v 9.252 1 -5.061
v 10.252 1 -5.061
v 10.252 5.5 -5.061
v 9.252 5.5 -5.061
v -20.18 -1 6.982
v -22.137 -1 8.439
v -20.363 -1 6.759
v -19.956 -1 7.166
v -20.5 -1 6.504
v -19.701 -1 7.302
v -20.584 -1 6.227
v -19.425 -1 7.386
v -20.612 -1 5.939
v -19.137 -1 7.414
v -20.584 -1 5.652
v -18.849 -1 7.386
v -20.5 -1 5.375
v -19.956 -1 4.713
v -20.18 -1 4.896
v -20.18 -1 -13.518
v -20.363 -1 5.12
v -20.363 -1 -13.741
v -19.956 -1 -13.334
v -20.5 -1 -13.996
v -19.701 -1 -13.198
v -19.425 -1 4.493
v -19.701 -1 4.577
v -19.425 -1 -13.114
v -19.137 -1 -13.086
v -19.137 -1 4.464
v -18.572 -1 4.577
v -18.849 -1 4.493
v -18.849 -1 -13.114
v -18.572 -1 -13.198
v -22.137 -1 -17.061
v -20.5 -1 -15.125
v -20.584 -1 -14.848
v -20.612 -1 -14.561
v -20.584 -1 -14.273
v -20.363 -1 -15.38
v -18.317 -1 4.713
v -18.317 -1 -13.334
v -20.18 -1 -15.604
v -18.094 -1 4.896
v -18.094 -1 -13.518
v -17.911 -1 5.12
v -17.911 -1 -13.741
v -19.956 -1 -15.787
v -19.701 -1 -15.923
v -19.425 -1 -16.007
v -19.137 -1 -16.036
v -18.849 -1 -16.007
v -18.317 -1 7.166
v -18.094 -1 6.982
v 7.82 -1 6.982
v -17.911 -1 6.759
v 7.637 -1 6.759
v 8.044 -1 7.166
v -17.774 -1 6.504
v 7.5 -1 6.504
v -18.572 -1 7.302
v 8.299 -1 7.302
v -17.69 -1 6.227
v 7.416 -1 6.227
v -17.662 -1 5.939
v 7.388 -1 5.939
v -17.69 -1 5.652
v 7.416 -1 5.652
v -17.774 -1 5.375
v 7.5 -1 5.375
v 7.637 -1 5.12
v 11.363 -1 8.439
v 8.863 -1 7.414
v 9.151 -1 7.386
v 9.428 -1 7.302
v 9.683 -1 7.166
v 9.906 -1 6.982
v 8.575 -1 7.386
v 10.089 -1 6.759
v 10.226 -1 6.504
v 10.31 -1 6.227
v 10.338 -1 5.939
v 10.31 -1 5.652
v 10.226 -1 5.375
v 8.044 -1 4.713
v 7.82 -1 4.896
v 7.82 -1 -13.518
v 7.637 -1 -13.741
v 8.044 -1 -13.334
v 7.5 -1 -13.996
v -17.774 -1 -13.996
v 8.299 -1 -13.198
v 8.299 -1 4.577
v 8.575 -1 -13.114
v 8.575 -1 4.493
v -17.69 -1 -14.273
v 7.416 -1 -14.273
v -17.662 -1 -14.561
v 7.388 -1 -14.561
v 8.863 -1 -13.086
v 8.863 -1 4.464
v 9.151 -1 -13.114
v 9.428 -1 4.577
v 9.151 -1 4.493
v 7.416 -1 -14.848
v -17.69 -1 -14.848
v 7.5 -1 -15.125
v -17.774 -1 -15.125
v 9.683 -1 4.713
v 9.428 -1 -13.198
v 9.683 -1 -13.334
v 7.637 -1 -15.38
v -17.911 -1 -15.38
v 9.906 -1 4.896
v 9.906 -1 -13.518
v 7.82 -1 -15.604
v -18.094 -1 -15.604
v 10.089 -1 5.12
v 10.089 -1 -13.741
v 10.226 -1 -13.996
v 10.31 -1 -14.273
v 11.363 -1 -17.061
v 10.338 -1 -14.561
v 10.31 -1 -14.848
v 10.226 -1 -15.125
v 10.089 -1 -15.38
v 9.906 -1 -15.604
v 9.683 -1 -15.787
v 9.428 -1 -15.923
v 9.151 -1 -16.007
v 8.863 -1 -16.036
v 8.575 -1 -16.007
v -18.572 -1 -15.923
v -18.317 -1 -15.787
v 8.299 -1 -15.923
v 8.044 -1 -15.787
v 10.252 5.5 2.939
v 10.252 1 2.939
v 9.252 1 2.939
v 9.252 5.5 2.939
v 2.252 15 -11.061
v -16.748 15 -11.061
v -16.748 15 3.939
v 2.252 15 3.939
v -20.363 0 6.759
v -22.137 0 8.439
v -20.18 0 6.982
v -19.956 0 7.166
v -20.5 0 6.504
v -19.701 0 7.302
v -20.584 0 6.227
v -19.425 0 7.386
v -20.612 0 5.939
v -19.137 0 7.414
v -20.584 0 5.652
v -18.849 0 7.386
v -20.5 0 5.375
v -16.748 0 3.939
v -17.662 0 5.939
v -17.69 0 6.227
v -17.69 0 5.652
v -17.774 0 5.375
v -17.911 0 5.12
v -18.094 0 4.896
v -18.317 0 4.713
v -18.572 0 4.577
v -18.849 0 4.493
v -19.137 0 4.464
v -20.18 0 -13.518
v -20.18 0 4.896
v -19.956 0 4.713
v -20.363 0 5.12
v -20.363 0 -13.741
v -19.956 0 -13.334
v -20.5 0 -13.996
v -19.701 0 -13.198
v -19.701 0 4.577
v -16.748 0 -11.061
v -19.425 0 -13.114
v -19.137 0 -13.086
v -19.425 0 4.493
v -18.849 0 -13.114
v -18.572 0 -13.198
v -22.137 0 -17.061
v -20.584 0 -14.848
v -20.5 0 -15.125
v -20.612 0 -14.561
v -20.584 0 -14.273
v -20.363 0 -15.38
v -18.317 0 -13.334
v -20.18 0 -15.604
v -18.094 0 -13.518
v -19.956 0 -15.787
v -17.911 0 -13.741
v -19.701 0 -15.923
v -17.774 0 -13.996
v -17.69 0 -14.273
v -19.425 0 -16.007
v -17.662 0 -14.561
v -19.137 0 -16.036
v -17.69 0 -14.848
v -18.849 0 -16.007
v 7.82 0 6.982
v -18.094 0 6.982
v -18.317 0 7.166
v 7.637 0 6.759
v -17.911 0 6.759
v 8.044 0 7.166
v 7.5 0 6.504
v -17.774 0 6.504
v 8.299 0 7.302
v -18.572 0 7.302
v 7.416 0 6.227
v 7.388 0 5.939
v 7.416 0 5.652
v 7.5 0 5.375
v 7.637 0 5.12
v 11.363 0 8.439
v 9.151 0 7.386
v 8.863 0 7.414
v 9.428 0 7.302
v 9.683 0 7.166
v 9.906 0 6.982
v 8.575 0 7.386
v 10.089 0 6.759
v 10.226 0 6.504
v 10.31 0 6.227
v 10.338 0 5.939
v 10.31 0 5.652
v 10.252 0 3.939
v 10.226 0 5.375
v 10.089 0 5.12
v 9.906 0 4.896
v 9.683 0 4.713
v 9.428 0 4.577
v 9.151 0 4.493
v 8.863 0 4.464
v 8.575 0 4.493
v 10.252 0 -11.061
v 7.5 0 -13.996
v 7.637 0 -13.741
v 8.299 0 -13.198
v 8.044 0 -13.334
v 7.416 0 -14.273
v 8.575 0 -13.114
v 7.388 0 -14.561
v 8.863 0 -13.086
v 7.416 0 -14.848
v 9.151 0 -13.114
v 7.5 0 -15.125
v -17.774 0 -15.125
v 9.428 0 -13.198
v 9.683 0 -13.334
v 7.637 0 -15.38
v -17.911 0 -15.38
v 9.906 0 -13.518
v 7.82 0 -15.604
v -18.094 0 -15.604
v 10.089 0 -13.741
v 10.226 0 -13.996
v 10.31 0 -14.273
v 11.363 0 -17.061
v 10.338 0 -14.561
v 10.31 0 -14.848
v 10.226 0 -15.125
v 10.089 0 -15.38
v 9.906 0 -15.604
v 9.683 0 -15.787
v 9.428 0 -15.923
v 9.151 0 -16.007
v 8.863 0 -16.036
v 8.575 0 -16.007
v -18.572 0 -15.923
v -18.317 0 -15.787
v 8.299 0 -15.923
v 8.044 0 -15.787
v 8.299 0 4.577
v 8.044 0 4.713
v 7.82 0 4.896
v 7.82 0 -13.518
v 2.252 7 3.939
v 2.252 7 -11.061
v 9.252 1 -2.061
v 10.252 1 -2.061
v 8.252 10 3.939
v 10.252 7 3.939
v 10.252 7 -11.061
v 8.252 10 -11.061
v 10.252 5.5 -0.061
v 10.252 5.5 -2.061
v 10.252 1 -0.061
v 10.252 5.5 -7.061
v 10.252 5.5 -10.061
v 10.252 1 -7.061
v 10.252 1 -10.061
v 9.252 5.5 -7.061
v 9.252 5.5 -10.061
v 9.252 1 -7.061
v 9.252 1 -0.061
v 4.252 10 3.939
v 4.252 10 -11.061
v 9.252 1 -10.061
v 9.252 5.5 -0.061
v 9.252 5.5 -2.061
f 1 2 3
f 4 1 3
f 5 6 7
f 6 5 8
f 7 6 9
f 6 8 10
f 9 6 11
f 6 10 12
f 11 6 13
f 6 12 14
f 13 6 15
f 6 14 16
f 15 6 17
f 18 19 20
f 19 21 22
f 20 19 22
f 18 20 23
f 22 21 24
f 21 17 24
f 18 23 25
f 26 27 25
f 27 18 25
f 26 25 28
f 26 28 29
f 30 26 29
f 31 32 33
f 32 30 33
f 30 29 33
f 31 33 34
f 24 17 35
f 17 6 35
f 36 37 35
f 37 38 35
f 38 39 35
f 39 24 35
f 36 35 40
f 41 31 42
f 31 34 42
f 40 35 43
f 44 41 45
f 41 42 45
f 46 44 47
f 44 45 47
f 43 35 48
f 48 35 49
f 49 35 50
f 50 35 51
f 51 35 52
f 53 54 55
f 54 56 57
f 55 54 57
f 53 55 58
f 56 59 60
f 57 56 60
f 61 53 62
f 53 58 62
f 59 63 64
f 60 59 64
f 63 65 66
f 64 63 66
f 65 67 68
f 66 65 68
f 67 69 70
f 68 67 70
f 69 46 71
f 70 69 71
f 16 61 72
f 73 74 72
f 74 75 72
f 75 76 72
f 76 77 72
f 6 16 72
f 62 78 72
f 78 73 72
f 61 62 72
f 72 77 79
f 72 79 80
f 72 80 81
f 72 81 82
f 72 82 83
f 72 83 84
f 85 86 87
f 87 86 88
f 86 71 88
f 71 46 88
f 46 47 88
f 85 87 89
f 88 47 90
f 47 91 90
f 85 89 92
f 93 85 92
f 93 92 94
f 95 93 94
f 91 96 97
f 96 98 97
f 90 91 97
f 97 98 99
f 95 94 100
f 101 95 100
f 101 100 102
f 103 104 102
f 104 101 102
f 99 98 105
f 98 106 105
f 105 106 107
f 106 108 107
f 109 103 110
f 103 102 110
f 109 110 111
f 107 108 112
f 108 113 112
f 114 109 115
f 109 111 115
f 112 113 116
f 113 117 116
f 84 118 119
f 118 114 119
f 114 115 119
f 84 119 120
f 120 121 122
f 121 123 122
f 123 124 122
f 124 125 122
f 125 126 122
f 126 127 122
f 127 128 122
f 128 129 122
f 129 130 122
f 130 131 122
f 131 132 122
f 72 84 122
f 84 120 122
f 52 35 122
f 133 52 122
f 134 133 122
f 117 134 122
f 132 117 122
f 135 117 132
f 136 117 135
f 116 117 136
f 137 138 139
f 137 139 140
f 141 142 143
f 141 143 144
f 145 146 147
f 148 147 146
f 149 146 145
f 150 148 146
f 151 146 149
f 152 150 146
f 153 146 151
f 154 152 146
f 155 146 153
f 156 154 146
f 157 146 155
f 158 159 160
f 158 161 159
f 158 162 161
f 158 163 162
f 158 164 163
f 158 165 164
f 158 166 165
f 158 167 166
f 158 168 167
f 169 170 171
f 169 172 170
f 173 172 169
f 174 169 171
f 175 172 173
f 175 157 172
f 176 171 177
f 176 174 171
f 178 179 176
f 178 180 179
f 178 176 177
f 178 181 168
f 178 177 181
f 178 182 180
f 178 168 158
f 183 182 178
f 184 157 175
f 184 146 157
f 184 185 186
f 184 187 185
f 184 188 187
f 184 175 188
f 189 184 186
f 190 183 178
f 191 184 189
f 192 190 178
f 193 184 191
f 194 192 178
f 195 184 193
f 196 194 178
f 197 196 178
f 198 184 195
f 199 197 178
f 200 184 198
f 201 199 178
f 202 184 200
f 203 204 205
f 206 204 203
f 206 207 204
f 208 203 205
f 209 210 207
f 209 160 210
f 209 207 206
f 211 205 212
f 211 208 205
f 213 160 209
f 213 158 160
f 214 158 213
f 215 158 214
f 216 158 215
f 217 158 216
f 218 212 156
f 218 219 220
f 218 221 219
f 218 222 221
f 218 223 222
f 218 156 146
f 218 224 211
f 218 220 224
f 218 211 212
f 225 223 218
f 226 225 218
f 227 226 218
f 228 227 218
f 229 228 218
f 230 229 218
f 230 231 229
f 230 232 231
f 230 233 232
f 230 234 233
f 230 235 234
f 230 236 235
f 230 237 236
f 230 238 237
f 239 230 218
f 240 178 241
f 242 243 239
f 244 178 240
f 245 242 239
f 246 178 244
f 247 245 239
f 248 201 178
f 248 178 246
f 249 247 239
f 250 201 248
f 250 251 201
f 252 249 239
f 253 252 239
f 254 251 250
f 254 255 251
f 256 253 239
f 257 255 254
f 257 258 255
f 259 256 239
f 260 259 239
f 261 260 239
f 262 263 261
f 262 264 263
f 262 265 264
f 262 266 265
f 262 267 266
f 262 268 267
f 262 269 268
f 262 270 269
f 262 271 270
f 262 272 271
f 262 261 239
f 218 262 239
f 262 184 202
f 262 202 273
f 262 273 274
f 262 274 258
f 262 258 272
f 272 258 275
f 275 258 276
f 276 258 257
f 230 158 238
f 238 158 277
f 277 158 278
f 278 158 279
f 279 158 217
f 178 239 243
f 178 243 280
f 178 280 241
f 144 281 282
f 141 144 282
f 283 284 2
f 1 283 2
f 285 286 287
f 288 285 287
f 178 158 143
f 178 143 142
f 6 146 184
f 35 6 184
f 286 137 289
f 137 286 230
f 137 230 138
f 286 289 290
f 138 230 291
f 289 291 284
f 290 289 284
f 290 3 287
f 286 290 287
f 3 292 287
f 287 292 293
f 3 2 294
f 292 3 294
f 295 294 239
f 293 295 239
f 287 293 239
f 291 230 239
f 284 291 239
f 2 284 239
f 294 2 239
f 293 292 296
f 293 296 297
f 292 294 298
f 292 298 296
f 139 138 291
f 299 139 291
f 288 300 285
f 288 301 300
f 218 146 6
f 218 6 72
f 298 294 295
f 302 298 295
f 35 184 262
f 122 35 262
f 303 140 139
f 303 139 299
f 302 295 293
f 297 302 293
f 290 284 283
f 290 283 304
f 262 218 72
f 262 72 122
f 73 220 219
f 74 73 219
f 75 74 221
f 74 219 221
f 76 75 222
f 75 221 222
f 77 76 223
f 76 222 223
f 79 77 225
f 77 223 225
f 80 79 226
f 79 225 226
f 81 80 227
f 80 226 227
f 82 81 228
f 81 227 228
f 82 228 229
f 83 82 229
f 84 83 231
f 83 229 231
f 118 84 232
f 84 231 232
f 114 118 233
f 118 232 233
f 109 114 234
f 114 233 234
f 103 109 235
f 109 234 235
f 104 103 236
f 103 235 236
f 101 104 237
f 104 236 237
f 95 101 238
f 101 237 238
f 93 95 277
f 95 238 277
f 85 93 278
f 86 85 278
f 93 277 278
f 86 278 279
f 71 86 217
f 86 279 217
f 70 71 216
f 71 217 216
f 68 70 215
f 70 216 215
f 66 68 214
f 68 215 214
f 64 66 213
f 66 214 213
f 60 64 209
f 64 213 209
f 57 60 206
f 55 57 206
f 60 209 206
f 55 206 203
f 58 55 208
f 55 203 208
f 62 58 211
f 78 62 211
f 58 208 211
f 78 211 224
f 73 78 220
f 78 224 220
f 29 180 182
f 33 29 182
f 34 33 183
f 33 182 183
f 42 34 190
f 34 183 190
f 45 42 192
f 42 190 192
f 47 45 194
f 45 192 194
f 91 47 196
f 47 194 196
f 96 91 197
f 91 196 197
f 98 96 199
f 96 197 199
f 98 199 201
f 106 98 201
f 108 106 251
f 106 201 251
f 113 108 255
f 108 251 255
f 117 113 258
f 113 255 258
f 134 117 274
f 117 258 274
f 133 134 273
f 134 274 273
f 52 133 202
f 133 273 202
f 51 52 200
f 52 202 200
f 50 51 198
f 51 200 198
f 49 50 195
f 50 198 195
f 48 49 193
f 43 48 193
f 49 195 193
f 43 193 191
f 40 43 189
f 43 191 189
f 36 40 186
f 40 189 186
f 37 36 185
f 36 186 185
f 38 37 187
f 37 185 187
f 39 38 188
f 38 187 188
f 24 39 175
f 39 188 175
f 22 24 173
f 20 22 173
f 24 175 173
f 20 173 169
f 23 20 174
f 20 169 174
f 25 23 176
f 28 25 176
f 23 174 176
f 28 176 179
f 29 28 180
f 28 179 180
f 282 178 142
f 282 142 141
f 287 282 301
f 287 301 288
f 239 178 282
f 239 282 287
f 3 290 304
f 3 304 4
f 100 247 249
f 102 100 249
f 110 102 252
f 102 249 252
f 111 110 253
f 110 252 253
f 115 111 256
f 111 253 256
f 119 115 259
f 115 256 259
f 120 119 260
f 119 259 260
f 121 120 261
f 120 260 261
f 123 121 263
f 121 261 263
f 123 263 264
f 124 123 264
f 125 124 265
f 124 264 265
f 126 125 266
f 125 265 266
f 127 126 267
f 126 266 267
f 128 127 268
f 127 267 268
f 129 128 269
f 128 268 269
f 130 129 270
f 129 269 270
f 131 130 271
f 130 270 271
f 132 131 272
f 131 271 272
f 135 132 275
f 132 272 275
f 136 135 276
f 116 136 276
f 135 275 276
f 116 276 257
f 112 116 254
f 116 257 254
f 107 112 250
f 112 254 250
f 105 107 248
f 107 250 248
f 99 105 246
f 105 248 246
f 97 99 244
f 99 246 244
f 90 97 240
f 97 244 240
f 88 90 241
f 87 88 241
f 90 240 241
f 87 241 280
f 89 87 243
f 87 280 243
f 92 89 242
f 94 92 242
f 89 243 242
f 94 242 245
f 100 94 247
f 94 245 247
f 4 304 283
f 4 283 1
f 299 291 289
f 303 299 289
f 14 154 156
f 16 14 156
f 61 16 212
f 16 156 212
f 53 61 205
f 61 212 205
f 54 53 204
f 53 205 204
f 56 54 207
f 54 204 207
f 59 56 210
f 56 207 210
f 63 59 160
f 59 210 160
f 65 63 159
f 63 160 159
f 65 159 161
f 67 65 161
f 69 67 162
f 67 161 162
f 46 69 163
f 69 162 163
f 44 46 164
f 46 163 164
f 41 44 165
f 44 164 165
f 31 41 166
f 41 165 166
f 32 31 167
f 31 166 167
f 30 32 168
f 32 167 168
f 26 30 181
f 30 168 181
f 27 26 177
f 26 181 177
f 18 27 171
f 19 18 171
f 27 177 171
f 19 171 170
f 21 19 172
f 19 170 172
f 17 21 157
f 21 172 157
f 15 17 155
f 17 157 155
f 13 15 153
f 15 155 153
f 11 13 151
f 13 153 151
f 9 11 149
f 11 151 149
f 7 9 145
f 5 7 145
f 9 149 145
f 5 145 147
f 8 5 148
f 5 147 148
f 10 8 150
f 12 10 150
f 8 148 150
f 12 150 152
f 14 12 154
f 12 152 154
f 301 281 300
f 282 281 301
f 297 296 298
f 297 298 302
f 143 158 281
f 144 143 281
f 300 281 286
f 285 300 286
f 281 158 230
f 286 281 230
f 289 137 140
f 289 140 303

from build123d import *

# Parameters (mm, degrees)
ESQUISSE1_W             = 33.5
ESQUISSE1_H             = 25.5
ESQUISSE1_R             = 1.475
BOSS_EXTRU_9_DEPTH      = 1
ESQUISSE1_17_W          = 8
ESQUISSE1_17_H          = 15
BOSS_EXTRU_12_DEPTH     = 10
CHANFREIN5_SIZE         = 2
CHANFREIN5_SIZE2        = 3
ESQUISSE6_W             = 3
ESQUISSE6_H             = 4.5
ENL_V_MAT_EXTRU_1_DEPTH = 1
ESQUISSE1_18_W          = 19
ESQUISSE1_18_H          = 15
BOSS_EXTRU_14_DEPTH     = 15


with BuildPart() as part:
    # Esquisse1 → Boss.-Extru.9 (new body)
    with BuildSketch(Plane(origin=(0, 0, 0), x_dir=(1, 0, 0), z_dir=(0, 1, 0))):
        with Locations((-5.3869574, 4.310655738)):
            Rectangle(ESQUISSE1_W, ESQUISSE1_H)
        with Locations((-19.1369574, -5.939344262)):
            Circle(ESQUISSE1_R, mode=Mode.SUBTRACT)
        with Locations((8.8630426, -5.939344262)):
            Circle(ESQUISSE1_R, mode=Mode.SUBTRACT)
        with Locations((-19.1369574, 14.560655738)):
            Circle(ESQUISSE1_R, mode=Mode.SUBTRACT)
        with Locations((8.8630426, 14.560655738)):
            Circle(ESQUISSE1_R, mode=Mode.SUBTRACT)
    extrude(amount=-BOSS_EXTRU_9_DEPTH)

    # Esquisse1<17> → Boss.-Extru.12 (add)
    with BuildSketch(Plane(origin=(0, 0, 0), x_dir=(1, 0, 0), z_dir=(0, 1, 0))):
        with Locations((6.252459016, 3.560655738)):
            Rectangle(ESQUISSE1_17_W, ESQUISSE1_17_H)
    extrude(amount=BOSS_EXTRU_12_DEPTH)

    # Chanfrein5
    chanfrein5_edges = [part.edges().sort_by_distance(p)[0] for p in [
        (2.252459016, 10, -3.560655738),
        (10.252459016, 10, -3.560655738),
    ]]
    chanfrein5_side = [part.faces().sort_by_distance(p)[0] for p in [
        (6.252459016, 10, -3.560655738),
    ]]
    chamfer(chanfrein5_edges, length=CHANFREIN5_SIZE, length2=CHANFREIN5_SIZE2, reference=chanfrein5_side[0])

    # Esquisse6 → Enlèv. mat.-Extru.1 (cut)
    with BuildSketch(Plane(origin=(10.252459016, 0, 0), x_dir=(0, 0, -1), z_dir=(1, 0, 0))):
        with Locations((3.560655738, 3.25)):
            Rectangle(ESQUISSE6_W, ESQUISSE6_H)
        with Locations((8.560655738, 3.25)):
            Rectangle(ESQUISSE6_W, ESQUISSE6_H)
        with Locations((-1.439344262, 3.25)):
            Rectangle(ESQUISSE6_W, ESQUISSE6_H)
    extrude(amount=-ENL_V_MAT_EXTRU_1_DEPTH, mode=Mode.SUBTRACT)

    # Esquisse1<18> → Boss.-Extru.14 (add)
    with BuildSketch(Plane(origin=(0, 0, 0), x_dir=(1, 0, 0), z_dir=(0, 1, 0))):
        with Locations((-7.247540984, 3.560655738)):
            Rectangle(ESQUISSE1_18_W, ESQUISSE1_18_H)
    extrude(amount=BOSS_EXTRU_14_DEPTH)


solid = part.part
